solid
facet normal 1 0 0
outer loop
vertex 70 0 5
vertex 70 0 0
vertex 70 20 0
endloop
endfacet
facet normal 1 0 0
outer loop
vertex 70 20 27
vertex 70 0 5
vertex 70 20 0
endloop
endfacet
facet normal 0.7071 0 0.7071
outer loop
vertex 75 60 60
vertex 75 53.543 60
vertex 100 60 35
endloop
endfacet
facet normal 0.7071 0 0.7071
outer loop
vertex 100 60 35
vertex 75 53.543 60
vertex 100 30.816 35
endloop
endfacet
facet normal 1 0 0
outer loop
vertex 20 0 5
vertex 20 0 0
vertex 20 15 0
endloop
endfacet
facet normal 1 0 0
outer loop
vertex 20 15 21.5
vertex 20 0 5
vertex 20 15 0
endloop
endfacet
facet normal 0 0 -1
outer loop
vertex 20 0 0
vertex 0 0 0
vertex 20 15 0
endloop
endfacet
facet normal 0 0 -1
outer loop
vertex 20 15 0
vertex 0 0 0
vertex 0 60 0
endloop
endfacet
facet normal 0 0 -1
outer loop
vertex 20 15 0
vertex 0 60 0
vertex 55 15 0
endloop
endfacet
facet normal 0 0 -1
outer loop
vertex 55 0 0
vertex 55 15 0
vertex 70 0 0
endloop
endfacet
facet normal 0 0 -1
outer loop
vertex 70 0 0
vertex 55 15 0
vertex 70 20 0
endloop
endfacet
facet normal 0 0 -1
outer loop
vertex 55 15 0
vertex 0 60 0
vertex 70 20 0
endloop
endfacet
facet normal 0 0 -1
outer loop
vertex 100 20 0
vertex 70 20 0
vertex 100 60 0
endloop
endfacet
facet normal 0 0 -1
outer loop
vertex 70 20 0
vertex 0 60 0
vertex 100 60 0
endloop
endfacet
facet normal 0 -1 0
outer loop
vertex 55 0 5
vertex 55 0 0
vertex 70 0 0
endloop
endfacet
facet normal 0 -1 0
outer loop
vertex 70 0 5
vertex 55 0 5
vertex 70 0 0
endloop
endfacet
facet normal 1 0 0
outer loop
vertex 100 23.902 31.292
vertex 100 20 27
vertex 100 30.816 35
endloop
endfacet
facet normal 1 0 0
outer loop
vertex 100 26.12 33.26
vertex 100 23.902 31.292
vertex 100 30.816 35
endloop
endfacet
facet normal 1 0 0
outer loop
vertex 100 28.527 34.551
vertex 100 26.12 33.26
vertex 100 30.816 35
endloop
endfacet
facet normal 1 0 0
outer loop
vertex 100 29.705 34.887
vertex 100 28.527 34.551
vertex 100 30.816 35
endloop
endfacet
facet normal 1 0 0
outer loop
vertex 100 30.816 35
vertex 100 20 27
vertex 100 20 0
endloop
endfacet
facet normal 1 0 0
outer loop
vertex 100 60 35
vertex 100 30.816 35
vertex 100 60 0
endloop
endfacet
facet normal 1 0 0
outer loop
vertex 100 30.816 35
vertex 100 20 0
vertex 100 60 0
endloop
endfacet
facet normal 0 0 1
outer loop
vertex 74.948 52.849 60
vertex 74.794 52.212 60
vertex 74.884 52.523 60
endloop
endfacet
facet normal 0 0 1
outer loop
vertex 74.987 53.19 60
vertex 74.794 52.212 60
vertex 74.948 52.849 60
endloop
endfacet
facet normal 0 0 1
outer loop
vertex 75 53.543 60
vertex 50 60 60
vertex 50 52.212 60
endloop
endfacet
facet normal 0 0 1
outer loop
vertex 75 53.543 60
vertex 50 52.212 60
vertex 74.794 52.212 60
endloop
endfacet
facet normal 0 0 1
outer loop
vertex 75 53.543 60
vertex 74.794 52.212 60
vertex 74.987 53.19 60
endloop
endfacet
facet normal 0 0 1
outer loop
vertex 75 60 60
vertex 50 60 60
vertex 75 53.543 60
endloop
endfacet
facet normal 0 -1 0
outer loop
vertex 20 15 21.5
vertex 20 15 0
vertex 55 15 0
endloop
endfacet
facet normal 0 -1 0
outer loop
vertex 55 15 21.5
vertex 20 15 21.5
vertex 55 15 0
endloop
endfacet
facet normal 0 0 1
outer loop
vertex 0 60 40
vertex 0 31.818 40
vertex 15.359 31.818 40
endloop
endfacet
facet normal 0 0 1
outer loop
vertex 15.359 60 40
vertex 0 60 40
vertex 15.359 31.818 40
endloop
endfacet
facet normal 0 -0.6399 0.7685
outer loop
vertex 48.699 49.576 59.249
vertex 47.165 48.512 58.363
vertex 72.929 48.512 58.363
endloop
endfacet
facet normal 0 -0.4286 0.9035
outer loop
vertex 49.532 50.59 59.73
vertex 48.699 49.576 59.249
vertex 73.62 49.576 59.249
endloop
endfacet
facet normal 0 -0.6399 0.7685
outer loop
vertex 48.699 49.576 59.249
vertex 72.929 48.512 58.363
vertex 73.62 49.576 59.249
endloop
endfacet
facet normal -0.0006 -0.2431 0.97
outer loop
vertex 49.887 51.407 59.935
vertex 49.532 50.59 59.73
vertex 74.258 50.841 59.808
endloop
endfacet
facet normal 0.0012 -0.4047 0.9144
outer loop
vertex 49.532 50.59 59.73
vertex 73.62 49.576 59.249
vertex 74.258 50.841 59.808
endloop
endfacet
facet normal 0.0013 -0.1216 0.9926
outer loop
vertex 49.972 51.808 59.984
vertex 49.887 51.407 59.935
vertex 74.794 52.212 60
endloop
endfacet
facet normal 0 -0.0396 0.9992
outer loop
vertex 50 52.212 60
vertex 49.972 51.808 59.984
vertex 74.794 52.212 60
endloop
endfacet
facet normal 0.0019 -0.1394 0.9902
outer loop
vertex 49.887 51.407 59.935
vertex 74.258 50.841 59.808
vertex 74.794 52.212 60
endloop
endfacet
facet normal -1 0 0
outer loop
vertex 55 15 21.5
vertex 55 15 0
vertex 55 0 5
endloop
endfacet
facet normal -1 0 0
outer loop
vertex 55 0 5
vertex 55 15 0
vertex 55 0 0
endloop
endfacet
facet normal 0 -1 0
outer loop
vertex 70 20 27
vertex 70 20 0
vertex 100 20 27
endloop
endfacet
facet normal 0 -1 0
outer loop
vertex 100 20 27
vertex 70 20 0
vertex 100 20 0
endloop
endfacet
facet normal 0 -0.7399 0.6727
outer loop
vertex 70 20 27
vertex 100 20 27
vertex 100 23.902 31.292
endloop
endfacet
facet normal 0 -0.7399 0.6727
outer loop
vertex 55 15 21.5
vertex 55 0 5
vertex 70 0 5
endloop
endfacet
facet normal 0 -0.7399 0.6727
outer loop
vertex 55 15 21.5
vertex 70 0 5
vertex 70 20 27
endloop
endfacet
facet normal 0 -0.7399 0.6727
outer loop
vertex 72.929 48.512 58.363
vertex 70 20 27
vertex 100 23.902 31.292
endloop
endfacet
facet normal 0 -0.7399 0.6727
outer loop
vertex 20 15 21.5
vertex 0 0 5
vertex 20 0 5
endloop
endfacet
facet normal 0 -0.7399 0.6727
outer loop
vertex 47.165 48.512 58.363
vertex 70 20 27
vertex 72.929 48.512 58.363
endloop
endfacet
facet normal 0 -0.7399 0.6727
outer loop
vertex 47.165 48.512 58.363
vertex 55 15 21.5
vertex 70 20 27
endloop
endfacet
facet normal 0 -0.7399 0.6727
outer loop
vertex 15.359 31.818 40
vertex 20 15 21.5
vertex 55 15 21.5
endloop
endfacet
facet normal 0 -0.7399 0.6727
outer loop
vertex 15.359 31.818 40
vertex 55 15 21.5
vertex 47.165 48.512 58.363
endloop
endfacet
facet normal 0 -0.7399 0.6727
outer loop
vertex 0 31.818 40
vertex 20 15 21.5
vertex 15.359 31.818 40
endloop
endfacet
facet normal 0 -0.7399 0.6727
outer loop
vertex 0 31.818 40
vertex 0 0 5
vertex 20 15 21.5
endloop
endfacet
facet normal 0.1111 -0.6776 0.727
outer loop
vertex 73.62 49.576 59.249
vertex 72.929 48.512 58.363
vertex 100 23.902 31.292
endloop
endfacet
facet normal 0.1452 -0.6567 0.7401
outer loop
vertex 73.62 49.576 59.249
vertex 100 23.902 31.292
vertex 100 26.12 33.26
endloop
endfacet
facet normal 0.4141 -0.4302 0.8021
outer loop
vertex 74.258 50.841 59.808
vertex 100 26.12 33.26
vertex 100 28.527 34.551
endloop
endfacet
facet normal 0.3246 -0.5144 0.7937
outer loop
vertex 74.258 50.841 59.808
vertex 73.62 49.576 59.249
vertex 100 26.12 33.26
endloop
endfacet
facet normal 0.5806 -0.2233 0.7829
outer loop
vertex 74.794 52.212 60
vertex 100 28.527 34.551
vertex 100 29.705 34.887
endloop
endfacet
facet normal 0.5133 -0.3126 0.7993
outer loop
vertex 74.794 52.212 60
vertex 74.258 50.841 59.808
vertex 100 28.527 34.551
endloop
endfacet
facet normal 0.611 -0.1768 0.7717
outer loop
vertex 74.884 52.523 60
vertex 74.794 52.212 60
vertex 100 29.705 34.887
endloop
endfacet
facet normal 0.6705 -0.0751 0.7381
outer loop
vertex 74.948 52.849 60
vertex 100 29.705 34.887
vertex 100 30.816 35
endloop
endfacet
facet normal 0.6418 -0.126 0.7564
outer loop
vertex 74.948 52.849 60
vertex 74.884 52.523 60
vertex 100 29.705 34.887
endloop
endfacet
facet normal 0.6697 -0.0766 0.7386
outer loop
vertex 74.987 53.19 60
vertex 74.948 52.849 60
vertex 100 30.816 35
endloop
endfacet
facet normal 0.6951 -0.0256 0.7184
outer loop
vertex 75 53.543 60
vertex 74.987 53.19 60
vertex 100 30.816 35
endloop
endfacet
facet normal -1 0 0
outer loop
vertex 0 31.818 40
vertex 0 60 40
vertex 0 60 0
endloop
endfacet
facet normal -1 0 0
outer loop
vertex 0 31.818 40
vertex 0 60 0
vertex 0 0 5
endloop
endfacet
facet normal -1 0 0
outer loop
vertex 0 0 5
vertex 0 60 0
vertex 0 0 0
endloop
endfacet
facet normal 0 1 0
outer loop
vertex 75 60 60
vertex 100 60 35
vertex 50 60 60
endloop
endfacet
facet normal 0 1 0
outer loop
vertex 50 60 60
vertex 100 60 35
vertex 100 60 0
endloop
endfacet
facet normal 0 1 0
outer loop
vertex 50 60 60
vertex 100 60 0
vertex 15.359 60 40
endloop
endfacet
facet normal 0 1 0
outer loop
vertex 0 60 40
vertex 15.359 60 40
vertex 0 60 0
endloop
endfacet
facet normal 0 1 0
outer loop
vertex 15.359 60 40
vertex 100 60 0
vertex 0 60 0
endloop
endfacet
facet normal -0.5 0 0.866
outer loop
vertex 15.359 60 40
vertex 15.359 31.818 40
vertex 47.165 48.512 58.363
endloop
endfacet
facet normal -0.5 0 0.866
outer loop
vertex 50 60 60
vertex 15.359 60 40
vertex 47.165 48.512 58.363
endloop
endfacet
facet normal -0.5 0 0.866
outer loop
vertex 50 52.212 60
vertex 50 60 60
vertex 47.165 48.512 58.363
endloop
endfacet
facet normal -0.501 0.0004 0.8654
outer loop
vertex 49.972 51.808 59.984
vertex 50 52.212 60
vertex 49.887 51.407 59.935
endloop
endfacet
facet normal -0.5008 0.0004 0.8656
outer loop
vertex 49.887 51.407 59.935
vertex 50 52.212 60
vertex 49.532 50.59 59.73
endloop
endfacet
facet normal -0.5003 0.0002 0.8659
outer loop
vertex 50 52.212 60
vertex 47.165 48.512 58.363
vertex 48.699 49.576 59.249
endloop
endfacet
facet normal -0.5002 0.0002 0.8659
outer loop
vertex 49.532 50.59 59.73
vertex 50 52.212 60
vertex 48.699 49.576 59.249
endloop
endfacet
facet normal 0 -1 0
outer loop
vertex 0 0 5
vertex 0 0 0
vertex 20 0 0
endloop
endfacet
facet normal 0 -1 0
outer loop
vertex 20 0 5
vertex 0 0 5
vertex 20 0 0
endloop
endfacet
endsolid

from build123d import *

# Parameters (mm, degrees)
F1_DEPTH = 60
F3_DEPTH = 60.001
F5_DEPTH = 100.001
F6_R     = 5


with BuildPart() as f1:
    # F0 (on Top) → F1 (new body)
    with BuildSketch(Plane.XY):
        Polygon((0, 60), (0, 0), (20, 0), (20, 15), (55, 15), (55, 0), (70, 0), (70, 20), (100, 20), (100, 60), align=None)
    extrude(amount=F1_DEPTH)

    # F2 (on Front) → F3 (cut, through all)
    with BuildSketch(Plane.XZ):
        Polygon((15.358984, 40), (50, 60), (0, 60), (0, 40), align=None)
        Polygon((100, 60), (75, 60), (100, 35), align=None)
    extrude(amount=-F3_DEPTH, mode=Mode.SUBTRACT)

    # F4 (on Right) → F5 (cut, through all)
    with BuildSketch(Plane.YZ):
        Polygon((0, 5), (50, 60), (0, 60), align=None)
    extrude(amount=F5_DEPTH, mode=Mode.SUBTRACT)

    # F6
    f6_edges = [f1.edges().sort_by_distance(p)[0] for p in [
        (62.5, 50, 60),
        (87.5, 38.636364, 47.5),
    ]]
    fillet(f6_edges, radius=F6_R)


solid = f1.part
